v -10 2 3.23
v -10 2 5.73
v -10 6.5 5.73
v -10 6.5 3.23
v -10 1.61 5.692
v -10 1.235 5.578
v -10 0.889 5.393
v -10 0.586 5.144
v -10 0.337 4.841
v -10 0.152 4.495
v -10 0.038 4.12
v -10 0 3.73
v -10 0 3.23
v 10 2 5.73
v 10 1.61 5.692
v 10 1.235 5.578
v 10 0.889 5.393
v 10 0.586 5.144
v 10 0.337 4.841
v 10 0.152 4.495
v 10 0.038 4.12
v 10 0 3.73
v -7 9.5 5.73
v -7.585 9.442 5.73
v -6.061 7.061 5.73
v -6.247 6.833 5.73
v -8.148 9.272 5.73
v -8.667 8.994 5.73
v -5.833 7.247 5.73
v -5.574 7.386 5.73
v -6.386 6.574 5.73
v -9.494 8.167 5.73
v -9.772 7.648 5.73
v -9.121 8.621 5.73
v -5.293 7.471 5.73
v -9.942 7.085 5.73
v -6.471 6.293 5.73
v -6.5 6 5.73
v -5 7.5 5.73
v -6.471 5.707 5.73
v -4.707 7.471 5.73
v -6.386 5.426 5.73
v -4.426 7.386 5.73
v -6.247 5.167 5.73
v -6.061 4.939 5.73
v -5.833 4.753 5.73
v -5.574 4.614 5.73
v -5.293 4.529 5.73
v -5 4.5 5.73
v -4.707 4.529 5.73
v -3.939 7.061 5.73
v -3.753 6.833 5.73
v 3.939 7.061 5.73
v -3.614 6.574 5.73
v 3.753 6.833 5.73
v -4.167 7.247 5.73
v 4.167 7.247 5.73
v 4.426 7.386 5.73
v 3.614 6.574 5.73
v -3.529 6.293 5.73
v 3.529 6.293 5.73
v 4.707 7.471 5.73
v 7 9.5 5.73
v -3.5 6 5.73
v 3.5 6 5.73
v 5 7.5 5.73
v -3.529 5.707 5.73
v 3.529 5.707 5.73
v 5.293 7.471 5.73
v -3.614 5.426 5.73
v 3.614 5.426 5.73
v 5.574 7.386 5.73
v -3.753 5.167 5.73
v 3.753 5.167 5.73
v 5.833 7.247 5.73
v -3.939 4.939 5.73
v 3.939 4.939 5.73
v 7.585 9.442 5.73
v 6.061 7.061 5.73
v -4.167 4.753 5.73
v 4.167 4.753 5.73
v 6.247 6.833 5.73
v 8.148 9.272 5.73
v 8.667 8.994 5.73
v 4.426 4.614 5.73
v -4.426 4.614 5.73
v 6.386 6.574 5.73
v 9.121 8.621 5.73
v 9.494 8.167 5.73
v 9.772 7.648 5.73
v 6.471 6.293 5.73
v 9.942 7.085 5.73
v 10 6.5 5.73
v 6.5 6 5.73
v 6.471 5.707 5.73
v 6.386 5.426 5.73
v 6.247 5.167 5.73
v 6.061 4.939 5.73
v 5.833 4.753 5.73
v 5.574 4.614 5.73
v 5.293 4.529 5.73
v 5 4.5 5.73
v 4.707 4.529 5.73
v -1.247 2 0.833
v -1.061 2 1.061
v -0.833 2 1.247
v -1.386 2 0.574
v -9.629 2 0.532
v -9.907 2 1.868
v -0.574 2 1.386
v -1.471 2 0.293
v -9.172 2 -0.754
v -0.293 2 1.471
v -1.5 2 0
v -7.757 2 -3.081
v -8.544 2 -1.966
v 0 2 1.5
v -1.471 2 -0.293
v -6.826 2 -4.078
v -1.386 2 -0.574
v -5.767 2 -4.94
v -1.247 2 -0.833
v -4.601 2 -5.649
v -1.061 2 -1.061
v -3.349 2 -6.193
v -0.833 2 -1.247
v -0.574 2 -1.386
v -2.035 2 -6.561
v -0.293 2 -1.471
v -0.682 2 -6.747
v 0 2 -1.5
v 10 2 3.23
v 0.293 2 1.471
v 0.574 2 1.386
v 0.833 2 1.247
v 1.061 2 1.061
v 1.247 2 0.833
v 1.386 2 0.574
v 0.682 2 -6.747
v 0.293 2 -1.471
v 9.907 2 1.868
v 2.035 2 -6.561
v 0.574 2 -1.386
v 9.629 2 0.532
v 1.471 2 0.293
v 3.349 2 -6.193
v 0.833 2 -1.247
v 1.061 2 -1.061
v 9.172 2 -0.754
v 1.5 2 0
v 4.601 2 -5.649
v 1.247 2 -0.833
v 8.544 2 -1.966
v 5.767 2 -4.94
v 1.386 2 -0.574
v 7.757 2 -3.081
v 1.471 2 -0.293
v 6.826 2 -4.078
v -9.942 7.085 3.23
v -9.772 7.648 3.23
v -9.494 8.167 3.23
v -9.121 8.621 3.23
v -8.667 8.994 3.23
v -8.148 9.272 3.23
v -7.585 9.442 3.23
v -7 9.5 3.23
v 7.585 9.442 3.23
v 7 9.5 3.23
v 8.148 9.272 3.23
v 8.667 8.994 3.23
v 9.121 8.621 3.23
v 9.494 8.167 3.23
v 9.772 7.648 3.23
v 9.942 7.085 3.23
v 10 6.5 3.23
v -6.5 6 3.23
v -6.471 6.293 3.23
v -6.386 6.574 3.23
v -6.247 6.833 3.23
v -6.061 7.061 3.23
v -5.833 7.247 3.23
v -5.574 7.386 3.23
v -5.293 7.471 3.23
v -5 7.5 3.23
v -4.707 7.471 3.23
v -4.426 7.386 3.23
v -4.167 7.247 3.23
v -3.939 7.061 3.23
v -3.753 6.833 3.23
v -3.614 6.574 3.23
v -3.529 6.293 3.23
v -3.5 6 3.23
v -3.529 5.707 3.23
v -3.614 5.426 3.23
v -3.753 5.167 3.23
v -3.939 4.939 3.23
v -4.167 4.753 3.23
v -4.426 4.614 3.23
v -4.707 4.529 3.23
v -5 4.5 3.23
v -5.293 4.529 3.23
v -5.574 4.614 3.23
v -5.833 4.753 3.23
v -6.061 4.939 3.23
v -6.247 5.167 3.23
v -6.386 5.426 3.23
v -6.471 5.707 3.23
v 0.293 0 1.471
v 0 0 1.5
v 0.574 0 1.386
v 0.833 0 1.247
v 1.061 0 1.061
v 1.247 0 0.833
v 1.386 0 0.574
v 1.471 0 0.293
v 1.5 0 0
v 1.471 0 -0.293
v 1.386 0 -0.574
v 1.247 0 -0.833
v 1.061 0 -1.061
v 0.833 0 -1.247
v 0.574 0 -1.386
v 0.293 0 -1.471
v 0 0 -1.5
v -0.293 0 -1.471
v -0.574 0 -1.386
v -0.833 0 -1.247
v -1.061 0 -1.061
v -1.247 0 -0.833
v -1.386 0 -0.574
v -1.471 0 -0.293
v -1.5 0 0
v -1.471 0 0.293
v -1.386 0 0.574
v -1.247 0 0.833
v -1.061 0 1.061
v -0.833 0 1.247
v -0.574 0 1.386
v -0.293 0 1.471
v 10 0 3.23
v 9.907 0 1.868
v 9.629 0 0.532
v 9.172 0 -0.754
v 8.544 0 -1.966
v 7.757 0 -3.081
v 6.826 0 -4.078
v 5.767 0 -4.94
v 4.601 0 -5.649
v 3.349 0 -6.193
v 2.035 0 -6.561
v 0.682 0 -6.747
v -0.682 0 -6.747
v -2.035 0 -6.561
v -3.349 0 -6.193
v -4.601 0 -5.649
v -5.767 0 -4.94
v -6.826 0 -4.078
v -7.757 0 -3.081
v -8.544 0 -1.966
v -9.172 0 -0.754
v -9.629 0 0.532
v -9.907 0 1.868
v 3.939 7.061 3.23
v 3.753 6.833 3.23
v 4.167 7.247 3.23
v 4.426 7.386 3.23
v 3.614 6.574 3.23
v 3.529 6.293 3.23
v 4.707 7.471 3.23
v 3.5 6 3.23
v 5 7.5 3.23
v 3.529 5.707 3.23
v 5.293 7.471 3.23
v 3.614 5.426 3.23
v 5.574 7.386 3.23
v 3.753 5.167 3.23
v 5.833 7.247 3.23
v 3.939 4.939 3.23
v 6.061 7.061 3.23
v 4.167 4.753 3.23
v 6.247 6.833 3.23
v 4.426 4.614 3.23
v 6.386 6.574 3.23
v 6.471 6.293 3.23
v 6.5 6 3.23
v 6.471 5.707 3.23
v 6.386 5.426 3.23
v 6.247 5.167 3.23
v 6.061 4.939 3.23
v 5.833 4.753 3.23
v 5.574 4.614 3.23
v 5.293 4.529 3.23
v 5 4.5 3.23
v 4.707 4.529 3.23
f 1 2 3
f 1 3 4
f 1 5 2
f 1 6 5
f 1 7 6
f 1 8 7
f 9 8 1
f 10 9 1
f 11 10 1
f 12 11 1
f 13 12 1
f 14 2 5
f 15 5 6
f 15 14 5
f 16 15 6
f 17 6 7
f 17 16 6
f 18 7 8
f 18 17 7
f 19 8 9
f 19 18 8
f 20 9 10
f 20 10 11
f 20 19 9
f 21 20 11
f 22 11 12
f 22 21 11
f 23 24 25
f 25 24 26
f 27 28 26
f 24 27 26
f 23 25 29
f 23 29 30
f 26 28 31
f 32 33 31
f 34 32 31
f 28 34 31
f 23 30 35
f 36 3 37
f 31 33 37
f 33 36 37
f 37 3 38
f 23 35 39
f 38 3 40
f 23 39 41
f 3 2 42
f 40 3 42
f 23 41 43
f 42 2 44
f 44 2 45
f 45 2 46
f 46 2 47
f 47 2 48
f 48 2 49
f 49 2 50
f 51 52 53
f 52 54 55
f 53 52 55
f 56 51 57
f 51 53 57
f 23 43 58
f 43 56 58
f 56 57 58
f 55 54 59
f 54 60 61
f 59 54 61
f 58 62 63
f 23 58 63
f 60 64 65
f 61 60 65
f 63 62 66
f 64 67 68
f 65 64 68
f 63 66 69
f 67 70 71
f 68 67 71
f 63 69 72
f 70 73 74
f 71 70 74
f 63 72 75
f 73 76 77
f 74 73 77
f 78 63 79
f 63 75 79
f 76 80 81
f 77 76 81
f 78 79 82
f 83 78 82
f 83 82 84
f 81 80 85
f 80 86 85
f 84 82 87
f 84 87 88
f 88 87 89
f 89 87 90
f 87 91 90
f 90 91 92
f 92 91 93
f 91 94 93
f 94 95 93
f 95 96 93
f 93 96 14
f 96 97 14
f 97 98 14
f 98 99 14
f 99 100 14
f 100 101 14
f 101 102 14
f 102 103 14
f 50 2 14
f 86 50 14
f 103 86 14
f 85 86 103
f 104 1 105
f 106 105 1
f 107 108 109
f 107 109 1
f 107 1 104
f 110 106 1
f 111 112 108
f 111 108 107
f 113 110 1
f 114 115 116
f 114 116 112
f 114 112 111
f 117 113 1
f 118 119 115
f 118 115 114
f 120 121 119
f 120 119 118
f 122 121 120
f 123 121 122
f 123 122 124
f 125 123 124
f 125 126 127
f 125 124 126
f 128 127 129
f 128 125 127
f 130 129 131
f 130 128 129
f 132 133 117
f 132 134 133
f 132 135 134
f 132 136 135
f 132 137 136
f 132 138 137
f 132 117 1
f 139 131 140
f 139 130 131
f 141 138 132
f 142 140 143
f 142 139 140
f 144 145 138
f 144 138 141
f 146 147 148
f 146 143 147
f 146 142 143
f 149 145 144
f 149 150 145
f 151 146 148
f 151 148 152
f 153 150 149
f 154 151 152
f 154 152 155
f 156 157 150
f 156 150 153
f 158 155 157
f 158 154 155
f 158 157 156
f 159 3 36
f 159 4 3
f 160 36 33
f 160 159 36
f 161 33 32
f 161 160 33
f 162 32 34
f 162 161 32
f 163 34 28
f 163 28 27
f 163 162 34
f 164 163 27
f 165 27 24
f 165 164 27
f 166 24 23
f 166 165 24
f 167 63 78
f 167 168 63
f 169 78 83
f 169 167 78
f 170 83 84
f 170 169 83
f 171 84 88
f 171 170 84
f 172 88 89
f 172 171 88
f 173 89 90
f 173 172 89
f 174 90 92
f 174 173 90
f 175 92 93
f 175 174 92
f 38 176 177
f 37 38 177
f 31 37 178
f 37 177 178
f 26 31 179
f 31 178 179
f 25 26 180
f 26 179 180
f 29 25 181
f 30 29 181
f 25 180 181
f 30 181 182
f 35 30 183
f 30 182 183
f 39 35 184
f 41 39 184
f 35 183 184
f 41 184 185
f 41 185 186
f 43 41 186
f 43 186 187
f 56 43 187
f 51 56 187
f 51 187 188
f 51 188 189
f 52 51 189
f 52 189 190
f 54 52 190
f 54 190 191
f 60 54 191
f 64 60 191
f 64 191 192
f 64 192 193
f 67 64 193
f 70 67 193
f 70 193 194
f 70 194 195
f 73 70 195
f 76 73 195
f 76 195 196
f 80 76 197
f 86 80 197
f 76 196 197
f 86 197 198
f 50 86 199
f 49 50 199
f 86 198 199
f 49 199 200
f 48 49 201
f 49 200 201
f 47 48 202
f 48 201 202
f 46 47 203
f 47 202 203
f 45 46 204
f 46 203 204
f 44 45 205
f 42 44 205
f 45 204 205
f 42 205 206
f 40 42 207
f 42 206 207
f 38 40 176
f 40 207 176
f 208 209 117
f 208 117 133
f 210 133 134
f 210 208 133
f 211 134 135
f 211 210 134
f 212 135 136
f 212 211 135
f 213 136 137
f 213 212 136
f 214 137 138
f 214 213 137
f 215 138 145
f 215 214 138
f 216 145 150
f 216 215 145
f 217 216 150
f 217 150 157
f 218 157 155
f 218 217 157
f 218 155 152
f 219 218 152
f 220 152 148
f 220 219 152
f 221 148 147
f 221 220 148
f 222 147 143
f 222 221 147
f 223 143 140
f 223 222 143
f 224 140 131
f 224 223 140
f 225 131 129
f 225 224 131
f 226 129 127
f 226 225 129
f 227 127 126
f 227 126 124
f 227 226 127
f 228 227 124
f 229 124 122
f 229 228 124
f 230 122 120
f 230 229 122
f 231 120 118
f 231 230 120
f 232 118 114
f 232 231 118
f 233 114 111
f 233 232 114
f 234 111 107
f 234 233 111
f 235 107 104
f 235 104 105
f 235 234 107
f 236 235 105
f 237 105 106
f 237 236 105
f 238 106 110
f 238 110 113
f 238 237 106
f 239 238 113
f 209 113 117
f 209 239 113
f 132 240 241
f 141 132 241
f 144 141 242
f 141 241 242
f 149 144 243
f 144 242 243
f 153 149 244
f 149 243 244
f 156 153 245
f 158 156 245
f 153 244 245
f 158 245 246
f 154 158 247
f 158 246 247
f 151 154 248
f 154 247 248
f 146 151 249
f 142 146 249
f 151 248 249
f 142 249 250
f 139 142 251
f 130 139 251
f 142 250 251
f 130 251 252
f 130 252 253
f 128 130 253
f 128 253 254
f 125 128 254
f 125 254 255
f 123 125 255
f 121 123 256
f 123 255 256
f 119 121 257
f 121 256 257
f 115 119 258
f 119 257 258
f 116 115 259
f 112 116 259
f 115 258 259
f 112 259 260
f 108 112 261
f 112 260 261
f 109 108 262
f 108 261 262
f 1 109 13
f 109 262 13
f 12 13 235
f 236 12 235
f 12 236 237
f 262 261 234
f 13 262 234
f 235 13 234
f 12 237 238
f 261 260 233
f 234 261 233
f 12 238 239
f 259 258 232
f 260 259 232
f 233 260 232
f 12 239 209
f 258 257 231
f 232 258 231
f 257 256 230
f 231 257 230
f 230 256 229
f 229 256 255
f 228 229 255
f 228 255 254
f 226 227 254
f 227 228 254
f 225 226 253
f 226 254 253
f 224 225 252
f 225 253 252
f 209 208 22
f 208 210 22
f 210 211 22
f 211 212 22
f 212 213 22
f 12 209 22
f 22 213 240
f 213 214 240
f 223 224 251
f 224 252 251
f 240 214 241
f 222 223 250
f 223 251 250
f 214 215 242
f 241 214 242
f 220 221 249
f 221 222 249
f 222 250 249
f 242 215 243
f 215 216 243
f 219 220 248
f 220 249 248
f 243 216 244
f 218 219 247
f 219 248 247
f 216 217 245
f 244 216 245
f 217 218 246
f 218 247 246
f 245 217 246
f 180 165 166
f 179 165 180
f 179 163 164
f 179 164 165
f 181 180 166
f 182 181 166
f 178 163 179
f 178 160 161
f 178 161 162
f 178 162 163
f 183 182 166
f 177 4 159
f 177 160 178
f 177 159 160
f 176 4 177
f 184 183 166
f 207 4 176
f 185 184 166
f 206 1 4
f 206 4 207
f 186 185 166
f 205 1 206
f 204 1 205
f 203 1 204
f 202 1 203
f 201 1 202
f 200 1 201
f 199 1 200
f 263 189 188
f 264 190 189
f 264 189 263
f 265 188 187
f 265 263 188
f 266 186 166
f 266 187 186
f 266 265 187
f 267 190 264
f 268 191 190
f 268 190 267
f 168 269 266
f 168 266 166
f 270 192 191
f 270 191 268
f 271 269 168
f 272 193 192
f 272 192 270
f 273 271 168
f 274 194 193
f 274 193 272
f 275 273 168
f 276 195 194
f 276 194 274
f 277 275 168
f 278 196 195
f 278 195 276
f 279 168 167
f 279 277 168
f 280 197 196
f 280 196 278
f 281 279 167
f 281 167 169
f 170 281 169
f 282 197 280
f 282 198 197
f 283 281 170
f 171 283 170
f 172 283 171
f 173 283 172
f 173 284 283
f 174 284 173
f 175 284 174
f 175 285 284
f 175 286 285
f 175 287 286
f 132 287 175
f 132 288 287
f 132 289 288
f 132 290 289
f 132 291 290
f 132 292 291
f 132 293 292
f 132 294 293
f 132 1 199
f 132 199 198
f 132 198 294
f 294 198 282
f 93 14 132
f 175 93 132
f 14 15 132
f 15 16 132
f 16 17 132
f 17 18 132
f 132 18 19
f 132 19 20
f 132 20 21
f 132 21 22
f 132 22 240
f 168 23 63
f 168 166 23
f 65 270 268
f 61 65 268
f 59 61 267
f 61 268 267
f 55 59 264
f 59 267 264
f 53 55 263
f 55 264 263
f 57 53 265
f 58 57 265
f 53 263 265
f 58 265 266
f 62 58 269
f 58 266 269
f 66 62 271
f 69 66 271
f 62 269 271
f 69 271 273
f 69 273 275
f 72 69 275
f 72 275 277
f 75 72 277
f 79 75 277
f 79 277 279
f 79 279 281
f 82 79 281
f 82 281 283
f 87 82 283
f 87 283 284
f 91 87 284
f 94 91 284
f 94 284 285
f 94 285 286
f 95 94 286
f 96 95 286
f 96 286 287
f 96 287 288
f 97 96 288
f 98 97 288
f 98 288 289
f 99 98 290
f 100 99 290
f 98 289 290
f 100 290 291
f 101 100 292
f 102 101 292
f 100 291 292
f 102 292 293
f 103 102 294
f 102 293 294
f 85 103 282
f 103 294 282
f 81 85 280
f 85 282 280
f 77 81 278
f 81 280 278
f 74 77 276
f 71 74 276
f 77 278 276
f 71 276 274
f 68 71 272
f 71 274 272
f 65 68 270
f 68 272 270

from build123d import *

# Parameters (mm, degrees)
SKETCH_1_R          = 1.5
EXTRUDE_2_DEPTH     = 2
SKETCH_1_5_W        = 20
SKETCH_1_5_H        = 2.5
EXTRUDE_3_DEPTH     = 9.5
SKETCH_2_R          = 1.5
CUT_EXTRUDE_1_DEPTH = 18.036725037
FILLET_1_R          = 3
FILLET_2_R          = 2


with BuildPart() as part:
    # 草图1 → 凸台-拉伸2 (new body)
    with BuildSketch(Plane(origin=(0, 0, 0), x_dir=(1, 0, 0), z_dir=(0, 1, 0))):
        with BuildLine():
            ThreePointArc((10, -3.23), (0, 6.77), (-10, -3.23))
            Line((-10, -3.23), (10, -3.23))
        make_face()
        Circle(SKETCH_1_R, mode=Mode.SUBTRACT)
    extrude(amount=EXTRUDE_2_DEPTH)

    # 草图1<5> → 凸台-拉伸3 (add)
    with BuildSketch(Plane(origin=(0, 0, 0), x_dir=(1, 0, 0), z_dir=(0, 1, 0))):
        with Locations((0, -4.48)):
            Rectangle(SKETCH_1_5_W, SKETCH_1_5_H)
    extrude(amount=EXTRUDE_3_DEPTH)

    # 草图2 → 切除-拉伸1 (cut, through all)
    with BuildSketch(Plane(origin=(0, 0, 3.23), x_dir=(-1, 0, 0), z_dir=(0, 0, -1))):
        with Locations((5, 6)):
            Circle(SKETCH_2_R)
        with Locations((-5, 6)):
            Circle(SKETCH_2_R)
    extrude(amount=-CUT_EXTRUDE_1_DEPTH, mode=Mode.SUBTRACT)

    # 圆角1
    fillet_1_edges = [part.edges().sort_by_distance(p)[0] for p in [
        (10, 9.5, 4.48),
        (-10, 9.5, 4.48),
    ]]
    fillet(fillet_1_edges, radius=FILLET_1_R)

    # 圆角2
    fillet_2_edges = [part.edges().sort_by_distance(p)[0] for p in [
        (0, 0, 5.73),
    ]]
    fillet(fillet_2_edges, radius=FILLET_2_R)


solid = part.part
